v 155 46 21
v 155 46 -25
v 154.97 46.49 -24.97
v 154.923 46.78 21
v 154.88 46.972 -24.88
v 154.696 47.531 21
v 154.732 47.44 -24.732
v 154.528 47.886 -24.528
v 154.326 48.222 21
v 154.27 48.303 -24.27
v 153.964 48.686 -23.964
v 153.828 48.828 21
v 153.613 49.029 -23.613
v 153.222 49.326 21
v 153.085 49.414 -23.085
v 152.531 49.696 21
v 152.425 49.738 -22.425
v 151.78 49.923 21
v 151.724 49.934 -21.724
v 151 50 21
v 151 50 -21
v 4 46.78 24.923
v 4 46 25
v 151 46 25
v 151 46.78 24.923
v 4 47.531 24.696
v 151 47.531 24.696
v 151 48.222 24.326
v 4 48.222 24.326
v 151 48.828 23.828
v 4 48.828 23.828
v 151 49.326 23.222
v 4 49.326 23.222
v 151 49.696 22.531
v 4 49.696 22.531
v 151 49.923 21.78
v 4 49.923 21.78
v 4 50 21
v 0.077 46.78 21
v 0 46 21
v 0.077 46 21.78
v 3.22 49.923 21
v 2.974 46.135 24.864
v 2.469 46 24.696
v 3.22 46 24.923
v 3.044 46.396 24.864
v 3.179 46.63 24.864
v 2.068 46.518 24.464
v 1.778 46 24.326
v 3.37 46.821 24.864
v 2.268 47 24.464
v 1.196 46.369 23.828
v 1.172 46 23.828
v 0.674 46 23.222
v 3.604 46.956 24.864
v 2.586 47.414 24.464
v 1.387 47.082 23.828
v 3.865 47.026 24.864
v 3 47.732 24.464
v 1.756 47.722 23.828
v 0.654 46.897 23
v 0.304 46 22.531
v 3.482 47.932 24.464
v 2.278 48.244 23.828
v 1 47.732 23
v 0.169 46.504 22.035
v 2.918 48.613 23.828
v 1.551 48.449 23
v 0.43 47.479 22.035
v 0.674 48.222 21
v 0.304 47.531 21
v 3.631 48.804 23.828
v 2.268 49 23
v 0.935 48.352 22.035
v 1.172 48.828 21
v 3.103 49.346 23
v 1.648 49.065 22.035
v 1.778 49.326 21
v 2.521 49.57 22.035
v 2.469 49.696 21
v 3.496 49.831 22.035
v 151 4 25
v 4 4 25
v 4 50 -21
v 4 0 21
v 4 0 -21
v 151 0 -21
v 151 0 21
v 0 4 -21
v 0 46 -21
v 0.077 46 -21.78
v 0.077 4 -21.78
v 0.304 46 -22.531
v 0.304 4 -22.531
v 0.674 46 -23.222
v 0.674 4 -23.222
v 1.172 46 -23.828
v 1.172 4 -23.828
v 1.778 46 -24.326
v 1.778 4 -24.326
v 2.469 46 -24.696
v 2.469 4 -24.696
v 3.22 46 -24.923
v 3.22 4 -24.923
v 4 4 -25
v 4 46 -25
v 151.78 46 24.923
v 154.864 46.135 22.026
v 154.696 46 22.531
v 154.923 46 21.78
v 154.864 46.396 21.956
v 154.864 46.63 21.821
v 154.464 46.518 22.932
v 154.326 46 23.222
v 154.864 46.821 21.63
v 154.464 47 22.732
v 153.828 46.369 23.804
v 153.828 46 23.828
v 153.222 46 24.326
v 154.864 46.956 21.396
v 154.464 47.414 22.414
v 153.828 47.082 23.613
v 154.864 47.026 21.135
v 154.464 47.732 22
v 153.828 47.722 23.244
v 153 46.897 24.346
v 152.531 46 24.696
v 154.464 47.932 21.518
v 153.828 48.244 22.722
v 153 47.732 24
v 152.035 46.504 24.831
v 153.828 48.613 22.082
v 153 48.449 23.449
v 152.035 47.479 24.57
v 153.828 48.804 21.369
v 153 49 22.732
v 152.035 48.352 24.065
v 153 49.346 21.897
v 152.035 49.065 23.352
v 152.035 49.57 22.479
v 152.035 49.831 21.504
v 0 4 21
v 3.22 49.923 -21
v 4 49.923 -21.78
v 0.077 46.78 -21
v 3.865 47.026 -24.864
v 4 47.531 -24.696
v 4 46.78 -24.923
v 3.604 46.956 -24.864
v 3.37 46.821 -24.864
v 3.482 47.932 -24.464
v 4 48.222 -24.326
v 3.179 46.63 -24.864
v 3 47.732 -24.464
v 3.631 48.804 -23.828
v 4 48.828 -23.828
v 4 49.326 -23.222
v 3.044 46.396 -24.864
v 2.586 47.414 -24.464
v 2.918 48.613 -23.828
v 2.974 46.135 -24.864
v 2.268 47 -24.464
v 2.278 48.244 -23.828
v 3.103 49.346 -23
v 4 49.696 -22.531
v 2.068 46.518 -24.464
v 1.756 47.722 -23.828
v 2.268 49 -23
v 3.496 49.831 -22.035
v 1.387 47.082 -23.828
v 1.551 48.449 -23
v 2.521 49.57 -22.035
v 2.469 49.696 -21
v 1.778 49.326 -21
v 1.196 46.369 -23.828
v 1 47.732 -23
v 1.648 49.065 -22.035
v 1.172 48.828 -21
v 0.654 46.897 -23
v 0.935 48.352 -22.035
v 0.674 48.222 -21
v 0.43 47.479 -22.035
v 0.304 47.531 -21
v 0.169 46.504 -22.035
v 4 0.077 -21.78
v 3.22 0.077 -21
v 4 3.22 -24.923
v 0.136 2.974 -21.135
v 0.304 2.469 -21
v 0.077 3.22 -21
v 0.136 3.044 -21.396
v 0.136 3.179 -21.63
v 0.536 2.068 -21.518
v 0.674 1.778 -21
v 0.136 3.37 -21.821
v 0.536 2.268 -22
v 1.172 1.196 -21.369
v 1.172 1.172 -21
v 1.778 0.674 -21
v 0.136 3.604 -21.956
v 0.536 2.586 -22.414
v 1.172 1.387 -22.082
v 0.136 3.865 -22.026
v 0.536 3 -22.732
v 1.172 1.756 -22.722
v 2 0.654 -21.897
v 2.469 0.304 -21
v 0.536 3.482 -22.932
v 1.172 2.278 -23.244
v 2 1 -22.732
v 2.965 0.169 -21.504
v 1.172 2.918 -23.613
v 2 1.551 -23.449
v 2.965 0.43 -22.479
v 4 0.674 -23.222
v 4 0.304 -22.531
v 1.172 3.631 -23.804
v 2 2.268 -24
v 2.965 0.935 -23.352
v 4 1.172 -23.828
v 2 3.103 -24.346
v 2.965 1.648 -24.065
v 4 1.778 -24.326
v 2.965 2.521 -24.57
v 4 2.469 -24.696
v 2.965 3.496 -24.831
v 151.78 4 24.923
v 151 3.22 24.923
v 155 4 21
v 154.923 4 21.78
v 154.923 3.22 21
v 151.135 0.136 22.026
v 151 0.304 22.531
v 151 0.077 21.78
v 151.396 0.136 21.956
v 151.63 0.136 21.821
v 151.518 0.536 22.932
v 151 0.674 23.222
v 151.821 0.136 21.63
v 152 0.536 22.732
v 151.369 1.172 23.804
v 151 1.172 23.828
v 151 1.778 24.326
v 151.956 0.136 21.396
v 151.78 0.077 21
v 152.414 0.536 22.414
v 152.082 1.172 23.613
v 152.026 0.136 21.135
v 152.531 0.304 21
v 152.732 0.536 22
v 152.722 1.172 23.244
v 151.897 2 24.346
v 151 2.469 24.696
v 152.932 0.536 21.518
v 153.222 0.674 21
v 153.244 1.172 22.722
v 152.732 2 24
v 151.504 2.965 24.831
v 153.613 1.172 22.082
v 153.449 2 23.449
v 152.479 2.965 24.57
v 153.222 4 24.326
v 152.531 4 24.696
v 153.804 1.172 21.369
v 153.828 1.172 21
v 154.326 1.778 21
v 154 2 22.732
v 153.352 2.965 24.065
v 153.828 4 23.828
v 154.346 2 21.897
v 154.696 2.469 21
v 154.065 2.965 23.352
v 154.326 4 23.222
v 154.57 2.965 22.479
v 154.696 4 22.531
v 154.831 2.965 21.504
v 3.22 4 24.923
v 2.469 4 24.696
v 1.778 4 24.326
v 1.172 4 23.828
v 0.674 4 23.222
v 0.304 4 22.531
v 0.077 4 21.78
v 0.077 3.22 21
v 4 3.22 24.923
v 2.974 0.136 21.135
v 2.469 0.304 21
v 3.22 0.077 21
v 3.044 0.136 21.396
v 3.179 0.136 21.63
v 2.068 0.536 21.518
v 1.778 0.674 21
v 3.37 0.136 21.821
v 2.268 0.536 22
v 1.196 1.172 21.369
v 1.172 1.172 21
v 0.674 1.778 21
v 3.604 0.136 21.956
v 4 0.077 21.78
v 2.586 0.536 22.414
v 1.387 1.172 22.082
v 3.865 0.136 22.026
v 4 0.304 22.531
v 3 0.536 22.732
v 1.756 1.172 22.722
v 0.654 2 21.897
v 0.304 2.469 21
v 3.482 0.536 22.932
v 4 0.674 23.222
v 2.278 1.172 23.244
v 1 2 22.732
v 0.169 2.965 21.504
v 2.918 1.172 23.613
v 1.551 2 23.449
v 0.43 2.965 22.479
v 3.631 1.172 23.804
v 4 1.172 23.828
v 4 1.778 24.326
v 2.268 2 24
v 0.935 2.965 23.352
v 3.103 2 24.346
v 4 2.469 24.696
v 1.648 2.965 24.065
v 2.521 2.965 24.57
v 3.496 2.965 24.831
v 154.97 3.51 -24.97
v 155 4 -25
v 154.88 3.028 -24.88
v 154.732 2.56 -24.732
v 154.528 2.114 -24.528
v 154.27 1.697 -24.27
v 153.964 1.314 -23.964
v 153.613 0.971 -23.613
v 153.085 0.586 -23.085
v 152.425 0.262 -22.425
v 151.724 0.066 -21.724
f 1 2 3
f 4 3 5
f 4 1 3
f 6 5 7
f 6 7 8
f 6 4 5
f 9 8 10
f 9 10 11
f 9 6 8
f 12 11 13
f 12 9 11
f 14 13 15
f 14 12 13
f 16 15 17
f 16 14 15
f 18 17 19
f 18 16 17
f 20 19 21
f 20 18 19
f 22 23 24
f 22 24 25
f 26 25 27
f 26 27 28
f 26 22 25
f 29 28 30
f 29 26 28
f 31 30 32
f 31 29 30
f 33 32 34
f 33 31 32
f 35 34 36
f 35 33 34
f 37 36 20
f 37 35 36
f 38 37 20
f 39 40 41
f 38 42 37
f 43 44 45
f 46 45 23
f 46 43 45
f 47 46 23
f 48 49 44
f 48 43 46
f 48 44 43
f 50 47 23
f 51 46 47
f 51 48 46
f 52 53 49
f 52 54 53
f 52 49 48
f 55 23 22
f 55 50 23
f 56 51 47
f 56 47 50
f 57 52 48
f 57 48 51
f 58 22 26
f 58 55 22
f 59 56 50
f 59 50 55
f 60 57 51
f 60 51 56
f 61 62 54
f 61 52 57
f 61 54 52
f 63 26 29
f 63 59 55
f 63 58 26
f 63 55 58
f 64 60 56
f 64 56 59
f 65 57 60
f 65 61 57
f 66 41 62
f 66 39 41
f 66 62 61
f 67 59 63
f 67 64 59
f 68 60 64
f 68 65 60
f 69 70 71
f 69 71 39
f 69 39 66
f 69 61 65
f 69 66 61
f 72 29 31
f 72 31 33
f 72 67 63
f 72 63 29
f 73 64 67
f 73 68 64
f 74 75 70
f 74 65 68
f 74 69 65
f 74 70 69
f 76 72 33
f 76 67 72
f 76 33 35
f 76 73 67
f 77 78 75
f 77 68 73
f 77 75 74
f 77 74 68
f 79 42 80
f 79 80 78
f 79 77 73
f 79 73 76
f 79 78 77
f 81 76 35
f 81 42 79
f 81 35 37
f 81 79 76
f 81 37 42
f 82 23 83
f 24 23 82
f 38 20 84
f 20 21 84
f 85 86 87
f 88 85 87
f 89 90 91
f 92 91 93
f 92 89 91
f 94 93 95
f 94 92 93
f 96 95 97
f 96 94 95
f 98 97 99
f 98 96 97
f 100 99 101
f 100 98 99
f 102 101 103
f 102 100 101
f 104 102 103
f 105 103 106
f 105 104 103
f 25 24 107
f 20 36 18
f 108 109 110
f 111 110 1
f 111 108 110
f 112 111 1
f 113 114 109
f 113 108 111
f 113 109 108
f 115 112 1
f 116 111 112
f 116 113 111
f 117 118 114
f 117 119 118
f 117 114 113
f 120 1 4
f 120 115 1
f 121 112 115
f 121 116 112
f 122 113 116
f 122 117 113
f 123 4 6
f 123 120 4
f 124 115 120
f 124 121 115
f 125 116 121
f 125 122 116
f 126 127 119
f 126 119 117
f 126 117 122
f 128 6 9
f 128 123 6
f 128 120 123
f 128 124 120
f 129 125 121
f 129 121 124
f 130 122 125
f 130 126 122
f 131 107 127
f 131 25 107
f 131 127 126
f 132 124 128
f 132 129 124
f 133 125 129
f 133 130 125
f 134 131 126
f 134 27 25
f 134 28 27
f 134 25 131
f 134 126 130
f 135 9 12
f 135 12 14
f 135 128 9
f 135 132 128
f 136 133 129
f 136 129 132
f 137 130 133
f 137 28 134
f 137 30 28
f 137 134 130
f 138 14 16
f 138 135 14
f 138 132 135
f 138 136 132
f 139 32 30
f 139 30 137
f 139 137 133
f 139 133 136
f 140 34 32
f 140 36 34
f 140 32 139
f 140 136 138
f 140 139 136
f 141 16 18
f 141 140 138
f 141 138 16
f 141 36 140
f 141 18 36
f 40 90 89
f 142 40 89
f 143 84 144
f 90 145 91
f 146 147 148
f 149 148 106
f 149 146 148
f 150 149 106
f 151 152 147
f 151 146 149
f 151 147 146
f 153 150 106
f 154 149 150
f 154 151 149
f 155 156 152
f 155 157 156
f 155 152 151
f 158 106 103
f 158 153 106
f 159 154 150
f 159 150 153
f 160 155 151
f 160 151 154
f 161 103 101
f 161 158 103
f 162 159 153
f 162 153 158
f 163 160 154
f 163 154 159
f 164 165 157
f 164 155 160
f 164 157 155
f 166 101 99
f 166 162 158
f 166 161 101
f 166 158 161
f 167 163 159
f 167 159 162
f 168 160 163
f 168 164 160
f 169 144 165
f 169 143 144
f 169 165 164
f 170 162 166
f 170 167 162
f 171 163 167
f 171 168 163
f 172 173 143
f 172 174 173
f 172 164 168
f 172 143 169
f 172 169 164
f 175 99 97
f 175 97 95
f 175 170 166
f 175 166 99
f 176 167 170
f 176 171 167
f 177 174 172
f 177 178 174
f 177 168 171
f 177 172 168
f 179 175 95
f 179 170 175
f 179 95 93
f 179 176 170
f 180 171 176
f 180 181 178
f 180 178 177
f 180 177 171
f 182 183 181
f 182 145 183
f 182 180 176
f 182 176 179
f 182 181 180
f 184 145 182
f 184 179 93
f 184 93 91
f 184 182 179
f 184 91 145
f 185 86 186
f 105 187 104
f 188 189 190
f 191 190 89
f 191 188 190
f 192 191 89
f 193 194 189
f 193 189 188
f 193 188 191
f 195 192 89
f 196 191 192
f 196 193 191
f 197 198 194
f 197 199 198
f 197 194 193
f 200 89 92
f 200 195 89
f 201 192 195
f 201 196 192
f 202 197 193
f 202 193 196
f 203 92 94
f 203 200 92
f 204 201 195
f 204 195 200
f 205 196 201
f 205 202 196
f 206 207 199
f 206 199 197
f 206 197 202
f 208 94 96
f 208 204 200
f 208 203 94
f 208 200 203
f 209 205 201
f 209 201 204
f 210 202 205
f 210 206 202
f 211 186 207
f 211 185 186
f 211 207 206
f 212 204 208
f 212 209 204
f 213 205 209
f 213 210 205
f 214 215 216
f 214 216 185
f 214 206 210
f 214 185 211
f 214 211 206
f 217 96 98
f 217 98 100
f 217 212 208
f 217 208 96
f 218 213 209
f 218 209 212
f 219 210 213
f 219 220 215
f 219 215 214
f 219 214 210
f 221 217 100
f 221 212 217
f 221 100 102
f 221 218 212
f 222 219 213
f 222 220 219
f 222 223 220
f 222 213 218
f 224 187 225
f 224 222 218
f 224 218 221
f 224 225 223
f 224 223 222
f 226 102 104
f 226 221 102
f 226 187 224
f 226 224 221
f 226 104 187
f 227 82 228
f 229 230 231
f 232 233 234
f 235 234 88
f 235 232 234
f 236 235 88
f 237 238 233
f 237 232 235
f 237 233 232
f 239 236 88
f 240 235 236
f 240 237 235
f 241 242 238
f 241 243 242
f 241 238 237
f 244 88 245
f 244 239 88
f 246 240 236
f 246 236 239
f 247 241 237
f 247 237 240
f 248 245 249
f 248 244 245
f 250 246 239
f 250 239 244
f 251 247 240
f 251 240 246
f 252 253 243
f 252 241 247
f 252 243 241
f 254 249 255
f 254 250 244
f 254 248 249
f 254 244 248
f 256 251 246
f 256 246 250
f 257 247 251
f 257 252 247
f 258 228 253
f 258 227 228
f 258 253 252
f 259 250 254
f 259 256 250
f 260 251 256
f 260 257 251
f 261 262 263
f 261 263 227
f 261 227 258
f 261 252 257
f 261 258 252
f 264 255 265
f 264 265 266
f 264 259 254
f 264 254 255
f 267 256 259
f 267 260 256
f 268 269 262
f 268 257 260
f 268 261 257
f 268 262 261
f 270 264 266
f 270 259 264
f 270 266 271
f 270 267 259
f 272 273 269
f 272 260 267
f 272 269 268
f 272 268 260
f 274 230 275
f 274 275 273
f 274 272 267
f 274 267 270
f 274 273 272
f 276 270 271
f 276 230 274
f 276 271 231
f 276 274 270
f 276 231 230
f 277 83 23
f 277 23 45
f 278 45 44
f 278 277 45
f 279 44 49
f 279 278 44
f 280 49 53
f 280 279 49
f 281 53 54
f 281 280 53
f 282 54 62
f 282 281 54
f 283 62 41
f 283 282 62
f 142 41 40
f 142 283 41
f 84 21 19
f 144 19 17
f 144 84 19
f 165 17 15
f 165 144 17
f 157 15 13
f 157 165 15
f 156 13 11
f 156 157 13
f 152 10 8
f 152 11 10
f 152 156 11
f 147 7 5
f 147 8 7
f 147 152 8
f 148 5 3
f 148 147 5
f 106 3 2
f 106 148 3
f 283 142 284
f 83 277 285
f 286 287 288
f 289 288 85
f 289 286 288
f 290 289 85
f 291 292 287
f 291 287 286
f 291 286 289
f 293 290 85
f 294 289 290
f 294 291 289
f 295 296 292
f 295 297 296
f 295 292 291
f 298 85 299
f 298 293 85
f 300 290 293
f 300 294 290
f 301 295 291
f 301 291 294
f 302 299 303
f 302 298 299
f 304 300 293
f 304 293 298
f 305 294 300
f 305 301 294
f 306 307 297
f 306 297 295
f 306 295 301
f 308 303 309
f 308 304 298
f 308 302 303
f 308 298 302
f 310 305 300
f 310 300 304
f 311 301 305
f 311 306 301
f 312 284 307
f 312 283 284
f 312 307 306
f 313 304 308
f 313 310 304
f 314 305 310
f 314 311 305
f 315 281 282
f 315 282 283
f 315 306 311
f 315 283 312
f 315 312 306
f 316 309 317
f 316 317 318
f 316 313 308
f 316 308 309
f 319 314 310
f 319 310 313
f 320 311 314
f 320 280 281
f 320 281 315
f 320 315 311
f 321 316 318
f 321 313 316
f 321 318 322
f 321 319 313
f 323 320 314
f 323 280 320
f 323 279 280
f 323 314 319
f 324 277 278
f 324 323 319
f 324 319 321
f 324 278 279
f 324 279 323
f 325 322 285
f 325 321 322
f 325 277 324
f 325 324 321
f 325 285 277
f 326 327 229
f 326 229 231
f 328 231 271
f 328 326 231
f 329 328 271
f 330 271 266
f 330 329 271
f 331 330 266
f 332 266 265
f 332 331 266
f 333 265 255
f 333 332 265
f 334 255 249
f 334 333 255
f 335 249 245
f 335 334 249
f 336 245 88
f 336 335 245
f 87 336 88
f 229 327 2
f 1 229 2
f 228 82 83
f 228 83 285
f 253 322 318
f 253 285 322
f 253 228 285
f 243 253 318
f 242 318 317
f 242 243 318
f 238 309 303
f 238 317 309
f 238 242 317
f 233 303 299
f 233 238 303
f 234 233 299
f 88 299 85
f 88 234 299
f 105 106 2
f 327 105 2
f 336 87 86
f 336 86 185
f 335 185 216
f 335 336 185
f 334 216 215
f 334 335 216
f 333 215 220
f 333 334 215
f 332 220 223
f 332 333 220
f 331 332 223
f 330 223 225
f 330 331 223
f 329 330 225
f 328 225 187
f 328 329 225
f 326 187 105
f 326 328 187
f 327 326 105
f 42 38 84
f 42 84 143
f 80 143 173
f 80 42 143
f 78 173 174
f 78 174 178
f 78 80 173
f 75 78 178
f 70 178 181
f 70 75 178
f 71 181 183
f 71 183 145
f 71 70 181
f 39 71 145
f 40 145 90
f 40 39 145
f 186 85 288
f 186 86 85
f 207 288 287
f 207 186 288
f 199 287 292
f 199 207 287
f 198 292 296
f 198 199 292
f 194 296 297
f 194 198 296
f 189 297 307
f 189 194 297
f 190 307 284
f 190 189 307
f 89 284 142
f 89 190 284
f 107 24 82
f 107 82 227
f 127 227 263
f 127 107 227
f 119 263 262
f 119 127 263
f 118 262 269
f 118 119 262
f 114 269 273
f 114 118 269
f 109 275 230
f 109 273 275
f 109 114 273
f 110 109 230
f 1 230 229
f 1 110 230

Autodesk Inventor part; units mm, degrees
ref_plane "YZ Plane" through (0, 0, 0) normal (1, 0, 0) x (0, 1, 0)
ref_plane "XZ Plane" through (0, 0, 0) normal (0, 1, 0) x (-1, 0, 0)
ref_plane "XY Plane" through (0, 0, 0) normal (0, 0, 1) x (1, 0, 0)
sketch "Эскиз1" plane through (0, 0, 0) normal (0, 0, 1) x (1, 0, 0)
  line L0 (155, 50) -> (0, 50)
  line L1 (0, 50) -> (0, 0)
  line L2 (0, 0) -> (155, 0)
  line L3 (155, 0) -> (155, 50)
  dimension "d0" = 155
  dimension "d1" = 50
extrude "Выдавливание1" add sketch "Эскиз1" along normal mid plane 50
fillet "Сопряжение1" radius 4 11 edges at (0, 50, 0) (77.5, 50, 25) (0, 25, 25) (155, 25, 25) (155, 50, 0) (155, 0, 0) (77.5, 0, 25) (77.5, 0, -25) (77.5, 50, -25) (0, 25, -25) (0, 0, 0)
properties part number "Батарея"
